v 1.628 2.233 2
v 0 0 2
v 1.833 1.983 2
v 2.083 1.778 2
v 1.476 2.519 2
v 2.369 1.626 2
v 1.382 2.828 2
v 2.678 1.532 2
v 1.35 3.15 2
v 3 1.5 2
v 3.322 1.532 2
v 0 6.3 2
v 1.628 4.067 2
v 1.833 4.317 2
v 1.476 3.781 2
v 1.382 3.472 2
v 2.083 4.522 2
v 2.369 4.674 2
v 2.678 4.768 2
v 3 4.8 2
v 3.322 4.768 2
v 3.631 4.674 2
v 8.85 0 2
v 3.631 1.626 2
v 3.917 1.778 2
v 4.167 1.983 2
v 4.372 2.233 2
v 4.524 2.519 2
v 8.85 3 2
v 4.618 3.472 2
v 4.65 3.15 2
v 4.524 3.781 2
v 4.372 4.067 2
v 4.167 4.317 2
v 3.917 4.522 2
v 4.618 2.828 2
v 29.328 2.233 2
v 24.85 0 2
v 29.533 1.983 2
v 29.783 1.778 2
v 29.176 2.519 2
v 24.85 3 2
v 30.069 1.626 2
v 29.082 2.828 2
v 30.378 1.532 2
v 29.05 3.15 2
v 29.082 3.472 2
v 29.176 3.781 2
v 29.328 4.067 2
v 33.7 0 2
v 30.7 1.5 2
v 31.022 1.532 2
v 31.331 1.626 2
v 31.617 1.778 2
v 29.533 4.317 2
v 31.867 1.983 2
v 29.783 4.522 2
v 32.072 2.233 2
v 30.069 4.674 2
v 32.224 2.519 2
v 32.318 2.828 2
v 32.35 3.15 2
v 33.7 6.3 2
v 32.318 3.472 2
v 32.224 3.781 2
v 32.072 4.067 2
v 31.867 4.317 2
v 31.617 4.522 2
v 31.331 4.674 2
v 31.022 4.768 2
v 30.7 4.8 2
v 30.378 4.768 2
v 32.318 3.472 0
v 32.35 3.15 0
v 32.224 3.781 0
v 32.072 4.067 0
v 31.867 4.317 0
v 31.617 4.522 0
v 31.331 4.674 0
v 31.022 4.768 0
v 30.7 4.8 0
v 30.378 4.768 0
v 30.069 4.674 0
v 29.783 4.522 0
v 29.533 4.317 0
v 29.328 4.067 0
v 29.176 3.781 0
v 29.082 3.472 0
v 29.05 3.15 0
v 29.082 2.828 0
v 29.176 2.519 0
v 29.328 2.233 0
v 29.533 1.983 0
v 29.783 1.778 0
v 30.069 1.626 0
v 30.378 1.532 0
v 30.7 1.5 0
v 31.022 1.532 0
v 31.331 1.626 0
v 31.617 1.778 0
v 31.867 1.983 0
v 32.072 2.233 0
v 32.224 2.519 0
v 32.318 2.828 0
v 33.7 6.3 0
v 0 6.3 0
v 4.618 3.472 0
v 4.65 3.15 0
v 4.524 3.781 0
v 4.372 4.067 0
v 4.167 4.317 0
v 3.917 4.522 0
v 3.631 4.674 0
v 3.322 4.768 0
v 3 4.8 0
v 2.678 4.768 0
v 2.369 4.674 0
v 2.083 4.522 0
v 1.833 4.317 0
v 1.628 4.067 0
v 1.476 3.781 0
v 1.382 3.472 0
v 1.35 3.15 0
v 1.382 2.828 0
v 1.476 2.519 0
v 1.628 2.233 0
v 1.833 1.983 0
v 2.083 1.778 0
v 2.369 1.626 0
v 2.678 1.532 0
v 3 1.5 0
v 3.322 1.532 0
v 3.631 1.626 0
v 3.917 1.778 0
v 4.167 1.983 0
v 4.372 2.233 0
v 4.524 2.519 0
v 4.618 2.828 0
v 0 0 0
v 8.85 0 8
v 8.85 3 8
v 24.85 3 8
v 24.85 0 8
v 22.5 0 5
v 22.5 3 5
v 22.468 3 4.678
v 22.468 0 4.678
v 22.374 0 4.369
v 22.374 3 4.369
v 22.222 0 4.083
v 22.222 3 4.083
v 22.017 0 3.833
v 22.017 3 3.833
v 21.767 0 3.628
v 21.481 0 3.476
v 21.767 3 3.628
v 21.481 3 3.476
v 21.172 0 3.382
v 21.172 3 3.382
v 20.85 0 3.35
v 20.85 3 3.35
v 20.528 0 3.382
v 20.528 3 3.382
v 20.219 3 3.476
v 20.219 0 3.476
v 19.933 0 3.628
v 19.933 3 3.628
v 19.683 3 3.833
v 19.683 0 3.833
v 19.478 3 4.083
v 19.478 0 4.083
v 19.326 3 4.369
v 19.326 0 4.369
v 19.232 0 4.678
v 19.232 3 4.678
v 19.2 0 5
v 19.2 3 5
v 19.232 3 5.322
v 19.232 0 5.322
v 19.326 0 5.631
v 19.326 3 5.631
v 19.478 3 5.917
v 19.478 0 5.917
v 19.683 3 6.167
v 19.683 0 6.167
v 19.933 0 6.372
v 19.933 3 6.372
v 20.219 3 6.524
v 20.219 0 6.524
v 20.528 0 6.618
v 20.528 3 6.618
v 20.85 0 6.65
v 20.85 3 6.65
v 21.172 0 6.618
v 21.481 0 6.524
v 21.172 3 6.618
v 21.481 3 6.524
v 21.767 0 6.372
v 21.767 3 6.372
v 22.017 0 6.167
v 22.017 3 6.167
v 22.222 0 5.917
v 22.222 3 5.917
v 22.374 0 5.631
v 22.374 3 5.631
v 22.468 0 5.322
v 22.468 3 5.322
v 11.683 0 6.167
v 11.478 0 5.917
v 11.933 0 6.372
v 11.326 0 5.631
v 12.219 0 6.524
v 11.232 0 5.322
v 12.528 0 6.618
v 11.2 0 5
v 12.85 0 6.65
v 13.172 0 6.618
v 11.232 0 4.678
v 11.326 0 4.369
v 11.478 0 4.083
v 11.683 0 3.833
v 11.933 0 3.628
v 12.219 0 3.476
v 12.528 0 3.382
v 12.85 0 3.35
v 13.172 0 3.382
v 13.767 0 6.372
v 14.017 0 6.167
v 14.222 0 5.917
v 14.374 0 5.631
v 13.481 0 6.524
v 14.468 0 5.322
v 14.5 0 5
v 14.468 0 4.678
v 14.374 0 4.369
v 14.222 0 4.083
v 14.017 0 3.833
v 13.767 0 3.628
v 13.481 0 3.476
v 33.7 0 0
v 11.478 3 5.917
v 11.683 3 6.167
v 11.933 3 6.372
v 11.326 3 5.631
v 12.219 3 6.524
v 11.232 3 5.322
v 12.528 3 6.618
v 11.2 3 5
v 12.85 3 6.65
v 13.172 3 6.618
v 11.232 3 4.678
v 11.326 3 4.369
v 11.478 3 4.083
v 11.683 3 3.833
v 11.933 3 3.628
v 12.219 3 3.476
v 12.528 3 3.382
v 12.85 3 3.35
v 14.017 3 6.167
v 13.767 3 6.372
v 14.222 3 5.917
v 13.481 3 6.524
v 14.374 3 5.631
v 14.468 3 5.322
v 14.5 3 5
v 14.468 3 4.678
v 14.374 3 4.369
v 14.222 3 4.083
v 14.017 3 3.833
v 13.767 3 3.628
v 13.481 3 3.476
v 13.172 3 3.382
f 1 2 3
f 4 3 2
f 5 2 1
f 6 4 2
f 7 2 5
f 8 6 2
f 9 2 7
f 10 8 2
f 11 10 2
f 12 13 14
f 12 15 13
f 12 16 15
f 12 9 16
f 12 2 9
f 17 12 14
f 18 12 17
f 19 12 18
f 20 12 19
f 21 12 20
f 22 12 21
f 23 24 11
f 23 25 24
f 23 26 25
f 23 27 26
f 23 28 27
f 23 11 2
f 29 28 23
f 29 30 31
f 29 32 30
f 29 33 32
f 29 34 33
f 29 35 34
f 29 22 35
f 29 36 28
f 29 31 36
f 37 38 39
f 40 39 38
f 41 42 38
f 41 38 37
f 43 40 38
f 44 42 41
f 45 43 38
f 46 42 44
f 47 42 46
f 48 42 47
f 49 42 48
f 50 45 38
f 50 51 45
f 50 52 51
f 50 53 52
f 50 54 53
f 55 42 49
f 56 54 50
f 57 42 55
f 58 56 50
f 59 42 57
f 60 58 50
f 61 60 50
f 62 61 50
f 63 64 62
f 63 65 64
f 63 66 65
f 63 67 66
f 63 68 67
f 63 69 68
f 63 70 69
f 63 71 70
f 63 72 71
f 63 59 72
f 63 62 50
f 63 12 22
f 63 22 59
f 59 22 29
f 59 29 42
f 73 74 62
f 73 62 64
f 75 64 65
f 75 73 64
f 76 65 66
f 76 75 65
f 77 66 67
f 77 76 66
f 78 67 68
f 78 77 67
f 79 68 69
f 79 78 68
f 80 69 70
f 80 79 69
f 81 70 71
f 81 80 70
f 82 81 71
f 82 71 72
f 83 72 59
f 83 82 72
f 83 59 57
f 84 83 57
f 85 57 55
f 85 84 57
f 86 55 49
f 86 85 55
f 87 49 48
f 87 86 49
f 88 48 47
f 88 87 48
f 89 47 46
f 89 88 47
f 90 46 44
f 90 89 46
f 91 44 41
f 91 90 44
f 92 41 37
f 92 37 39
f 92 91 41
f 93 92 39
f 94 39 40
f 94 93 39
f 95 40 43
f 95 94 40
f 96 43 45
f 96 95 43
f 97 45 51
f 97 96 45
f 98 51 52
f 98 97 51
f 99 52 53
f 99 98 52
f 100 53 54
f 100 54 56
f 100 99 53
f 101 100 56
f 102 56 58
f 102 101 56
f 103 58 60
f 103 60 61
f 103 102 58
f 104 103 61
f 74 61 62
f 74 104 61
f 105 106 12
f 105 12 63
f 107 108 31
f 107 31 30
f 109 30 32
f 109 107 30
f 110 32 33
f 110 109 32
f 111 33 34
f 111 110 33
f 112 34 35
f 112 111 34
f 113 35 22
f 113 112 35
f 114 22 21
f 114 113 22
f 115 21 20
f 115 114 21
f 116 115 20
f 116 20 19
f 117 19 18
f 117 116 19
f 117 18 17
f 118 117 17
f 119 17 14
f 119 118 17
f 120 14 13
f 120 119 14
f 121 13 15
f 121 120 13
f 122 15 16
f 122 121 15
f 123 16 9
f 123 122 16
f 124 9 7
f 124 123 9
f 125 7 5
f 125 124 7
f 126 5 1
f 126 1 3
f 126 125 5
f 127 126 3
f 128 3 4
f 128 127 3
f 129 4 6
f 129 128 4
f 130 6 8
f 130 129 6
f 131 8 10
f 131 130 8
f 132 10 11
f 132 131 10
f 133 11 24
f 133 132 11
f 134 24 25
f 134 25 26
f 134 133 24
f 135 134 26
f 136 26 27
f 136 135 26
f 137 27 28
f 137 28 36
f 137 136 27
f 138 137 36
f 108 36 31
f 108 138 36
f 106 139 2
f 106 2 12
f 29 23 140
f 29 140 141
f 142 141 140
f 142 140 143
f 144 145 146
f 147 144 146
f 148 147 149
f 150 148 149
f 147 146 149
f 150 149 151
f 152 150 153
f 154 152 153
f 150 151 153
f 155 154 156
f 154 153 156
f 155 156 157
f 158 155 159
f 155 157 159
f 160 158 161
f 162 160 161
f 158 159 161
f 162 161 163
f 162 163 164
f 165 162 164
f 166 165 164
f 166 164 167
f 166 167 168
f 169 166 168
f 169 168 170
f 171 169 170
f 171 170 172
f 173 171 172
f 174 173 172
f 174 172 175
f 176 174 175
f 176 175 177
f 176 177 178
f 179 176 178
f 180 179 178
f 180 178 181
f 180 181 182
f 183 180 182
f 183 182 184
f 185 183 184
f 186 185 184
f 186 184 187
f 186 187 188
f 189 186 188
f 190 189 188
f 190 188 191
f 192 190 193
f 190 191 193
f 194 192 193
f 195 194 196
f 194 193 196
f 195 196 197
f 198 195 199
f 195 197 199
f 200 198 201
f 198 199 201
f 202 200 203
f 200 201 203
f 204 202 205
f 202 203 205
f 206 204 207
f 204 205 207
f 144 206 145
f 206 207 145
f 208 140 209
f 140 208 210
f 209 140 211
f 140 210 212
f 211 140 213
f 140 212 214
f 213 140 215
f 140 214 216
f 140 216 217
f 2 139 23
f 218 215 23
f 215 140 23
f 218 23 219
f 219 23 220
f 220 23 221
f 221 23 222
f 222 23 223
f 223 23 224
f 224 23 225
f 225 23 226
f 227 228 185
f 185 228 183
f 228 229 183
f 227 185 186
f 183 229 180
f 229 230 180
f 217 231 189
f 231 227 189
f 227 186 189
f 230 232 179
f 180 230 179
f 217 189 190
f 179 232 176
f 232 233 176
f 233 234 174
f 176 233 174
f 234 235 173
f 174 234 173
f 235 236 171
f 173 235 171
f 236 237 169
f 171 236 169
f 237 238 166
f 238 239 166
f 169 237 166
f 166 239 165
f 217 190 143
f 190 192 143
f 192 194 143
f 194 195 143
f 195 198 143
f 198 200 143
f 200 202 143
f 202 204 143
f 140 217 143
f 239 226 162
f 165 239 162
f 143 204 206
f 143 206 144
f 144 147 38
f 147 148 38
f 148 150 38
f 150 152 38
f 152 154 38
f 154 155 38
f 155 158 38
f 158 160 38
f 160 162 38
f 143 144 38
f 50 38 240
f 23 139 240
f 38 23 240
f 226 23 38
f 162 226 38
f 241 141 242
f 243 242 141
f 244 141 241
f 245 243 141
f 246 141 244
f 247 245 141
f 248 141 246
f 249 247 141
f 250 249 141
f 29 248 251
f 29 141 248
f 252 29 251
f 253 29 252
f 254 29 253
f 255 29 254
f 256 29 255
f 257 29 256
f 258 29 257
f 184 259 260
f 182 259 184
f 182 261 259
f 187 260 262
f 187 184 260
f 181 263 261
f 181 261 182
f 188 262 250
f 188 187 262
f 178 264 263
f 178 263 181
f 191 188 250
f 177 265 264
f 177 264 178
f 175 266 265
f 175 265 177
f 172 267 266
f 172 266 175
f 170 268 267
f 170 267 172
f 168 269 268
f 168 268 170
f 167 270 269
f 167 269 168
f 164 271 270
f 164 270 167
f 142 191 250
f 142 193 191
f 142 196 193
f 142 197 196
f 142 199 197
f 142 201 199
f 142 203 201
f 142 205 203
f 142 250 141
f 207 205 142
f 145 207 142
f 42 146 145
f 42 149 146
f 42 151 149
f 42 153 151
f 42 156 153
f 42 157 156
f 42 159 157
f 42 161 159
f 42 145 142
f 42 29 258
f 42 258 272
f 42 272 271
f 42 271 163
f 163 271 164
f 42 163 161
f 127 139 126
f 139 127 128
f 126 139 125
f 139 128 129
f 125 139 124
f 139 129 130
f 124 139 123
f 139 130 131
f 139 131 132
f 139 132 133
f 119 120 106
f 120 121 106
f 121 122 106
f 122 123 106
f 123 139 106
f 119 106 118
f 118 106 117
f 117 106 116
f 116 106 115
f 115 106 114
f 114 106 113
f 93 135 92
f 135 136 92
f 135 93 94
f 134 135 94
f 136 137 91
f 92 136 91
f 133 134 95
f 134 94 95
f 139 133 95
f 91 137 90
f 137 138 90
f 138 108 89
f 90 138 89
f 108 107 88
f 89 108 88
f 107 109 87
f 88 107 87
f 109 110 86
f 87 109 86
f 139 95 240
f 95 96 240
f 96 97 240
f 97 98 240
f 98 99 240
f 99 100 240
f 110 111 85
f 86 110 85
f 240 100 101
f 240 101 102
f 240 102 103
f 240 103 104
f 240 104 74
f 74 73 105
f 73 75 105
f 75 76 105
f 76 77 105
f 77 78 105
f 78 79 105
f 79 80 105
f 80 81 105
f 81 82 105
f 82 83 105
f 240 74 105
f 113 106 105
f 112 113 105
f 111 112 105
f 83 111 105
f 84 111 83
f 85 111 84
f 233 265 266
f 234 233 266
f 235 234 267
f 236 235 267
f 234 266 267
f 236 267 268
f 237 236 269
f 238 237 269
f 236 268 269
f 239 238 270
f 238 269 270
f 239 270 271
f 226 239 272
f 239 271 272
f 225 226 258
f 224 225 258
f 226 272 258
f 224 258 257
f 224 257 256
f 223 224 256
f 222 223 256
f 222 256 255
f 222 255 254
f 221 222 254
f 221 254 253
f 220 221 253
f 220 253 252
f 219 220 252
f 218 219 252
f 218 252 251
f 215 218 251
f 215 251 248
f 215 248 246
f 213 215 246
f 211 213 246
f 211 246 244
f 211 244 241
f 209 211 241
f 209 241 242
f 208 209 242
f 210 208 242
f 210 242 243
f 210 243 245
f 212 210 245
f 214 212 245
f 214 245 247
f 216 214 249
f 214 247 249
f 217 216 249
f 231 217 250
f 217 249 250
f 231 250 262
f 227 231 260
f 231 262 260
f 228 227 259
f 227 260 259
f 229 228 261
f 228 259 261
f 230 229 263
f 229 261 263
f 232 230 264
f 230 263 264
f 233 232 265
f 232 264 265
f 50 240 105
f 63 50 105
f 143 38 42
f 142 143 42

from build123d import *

# Parameters (mm, degrees)
SKETCH1_W           = 33.7
SKETCH1_H           = 6.3
SKETCH1_R           = 1.65
BOSS_EXTRUDE1_DEPTH = 2
SKETCH2_W           = 16
SKETCH2_H           = 3
BOSS_EXTRUDE2_DEPTH = 6
SKETCH3_R           = 1.65
CUT_EXTRUDE1_DEPTH  = 6


with BuildPart() as part:
    # Sketch1 → Boss-Extrude1 (new body)
    with BuildSketch(Plane.XY):
        with Locations((16.85, 3.15)):
            Rectangle(SKETCH1_W, SKETCH1_H)
        with Locations((3, 3.15)):
            Circle(SKETCH1_R, mode=Mode.SUBTRACT)
        with Locations((30.7, 3.15)):
            Circle(SKETCH1_R, mode=Mode.SUBTRACT)
    extrude(amount=BOSS_EXTRUDE1_DEPTH)

    # Sketch2 → Boss-Extrude2 (add)
    with BuildSketch(Plane.XY.offset(2)):
        with Locations((16.85, 1.5)):
            Rectangle(SKETCH2_W, SKETCH2_H)
    extrude(amount=BOSS_EXTRUDE2_DEPTH)

    # Sketch3 → Cut-Extrude1 (cut)
    with BuildSketch(Plane(origin=(0, 3, 0), x_dir=(1, 0, 0), z_dir=(0, 1, 0))):
        with Locations((12.85, -5)):
            Circle(SKETCH3_R)
        with Locations((20.85, -5)):
            Circle(SKETCH3_R)
    extrude(amount=-CUT_EXTRUDE1_DEPTH, mode=Mode.SUBTRACT)


solid = part.part
